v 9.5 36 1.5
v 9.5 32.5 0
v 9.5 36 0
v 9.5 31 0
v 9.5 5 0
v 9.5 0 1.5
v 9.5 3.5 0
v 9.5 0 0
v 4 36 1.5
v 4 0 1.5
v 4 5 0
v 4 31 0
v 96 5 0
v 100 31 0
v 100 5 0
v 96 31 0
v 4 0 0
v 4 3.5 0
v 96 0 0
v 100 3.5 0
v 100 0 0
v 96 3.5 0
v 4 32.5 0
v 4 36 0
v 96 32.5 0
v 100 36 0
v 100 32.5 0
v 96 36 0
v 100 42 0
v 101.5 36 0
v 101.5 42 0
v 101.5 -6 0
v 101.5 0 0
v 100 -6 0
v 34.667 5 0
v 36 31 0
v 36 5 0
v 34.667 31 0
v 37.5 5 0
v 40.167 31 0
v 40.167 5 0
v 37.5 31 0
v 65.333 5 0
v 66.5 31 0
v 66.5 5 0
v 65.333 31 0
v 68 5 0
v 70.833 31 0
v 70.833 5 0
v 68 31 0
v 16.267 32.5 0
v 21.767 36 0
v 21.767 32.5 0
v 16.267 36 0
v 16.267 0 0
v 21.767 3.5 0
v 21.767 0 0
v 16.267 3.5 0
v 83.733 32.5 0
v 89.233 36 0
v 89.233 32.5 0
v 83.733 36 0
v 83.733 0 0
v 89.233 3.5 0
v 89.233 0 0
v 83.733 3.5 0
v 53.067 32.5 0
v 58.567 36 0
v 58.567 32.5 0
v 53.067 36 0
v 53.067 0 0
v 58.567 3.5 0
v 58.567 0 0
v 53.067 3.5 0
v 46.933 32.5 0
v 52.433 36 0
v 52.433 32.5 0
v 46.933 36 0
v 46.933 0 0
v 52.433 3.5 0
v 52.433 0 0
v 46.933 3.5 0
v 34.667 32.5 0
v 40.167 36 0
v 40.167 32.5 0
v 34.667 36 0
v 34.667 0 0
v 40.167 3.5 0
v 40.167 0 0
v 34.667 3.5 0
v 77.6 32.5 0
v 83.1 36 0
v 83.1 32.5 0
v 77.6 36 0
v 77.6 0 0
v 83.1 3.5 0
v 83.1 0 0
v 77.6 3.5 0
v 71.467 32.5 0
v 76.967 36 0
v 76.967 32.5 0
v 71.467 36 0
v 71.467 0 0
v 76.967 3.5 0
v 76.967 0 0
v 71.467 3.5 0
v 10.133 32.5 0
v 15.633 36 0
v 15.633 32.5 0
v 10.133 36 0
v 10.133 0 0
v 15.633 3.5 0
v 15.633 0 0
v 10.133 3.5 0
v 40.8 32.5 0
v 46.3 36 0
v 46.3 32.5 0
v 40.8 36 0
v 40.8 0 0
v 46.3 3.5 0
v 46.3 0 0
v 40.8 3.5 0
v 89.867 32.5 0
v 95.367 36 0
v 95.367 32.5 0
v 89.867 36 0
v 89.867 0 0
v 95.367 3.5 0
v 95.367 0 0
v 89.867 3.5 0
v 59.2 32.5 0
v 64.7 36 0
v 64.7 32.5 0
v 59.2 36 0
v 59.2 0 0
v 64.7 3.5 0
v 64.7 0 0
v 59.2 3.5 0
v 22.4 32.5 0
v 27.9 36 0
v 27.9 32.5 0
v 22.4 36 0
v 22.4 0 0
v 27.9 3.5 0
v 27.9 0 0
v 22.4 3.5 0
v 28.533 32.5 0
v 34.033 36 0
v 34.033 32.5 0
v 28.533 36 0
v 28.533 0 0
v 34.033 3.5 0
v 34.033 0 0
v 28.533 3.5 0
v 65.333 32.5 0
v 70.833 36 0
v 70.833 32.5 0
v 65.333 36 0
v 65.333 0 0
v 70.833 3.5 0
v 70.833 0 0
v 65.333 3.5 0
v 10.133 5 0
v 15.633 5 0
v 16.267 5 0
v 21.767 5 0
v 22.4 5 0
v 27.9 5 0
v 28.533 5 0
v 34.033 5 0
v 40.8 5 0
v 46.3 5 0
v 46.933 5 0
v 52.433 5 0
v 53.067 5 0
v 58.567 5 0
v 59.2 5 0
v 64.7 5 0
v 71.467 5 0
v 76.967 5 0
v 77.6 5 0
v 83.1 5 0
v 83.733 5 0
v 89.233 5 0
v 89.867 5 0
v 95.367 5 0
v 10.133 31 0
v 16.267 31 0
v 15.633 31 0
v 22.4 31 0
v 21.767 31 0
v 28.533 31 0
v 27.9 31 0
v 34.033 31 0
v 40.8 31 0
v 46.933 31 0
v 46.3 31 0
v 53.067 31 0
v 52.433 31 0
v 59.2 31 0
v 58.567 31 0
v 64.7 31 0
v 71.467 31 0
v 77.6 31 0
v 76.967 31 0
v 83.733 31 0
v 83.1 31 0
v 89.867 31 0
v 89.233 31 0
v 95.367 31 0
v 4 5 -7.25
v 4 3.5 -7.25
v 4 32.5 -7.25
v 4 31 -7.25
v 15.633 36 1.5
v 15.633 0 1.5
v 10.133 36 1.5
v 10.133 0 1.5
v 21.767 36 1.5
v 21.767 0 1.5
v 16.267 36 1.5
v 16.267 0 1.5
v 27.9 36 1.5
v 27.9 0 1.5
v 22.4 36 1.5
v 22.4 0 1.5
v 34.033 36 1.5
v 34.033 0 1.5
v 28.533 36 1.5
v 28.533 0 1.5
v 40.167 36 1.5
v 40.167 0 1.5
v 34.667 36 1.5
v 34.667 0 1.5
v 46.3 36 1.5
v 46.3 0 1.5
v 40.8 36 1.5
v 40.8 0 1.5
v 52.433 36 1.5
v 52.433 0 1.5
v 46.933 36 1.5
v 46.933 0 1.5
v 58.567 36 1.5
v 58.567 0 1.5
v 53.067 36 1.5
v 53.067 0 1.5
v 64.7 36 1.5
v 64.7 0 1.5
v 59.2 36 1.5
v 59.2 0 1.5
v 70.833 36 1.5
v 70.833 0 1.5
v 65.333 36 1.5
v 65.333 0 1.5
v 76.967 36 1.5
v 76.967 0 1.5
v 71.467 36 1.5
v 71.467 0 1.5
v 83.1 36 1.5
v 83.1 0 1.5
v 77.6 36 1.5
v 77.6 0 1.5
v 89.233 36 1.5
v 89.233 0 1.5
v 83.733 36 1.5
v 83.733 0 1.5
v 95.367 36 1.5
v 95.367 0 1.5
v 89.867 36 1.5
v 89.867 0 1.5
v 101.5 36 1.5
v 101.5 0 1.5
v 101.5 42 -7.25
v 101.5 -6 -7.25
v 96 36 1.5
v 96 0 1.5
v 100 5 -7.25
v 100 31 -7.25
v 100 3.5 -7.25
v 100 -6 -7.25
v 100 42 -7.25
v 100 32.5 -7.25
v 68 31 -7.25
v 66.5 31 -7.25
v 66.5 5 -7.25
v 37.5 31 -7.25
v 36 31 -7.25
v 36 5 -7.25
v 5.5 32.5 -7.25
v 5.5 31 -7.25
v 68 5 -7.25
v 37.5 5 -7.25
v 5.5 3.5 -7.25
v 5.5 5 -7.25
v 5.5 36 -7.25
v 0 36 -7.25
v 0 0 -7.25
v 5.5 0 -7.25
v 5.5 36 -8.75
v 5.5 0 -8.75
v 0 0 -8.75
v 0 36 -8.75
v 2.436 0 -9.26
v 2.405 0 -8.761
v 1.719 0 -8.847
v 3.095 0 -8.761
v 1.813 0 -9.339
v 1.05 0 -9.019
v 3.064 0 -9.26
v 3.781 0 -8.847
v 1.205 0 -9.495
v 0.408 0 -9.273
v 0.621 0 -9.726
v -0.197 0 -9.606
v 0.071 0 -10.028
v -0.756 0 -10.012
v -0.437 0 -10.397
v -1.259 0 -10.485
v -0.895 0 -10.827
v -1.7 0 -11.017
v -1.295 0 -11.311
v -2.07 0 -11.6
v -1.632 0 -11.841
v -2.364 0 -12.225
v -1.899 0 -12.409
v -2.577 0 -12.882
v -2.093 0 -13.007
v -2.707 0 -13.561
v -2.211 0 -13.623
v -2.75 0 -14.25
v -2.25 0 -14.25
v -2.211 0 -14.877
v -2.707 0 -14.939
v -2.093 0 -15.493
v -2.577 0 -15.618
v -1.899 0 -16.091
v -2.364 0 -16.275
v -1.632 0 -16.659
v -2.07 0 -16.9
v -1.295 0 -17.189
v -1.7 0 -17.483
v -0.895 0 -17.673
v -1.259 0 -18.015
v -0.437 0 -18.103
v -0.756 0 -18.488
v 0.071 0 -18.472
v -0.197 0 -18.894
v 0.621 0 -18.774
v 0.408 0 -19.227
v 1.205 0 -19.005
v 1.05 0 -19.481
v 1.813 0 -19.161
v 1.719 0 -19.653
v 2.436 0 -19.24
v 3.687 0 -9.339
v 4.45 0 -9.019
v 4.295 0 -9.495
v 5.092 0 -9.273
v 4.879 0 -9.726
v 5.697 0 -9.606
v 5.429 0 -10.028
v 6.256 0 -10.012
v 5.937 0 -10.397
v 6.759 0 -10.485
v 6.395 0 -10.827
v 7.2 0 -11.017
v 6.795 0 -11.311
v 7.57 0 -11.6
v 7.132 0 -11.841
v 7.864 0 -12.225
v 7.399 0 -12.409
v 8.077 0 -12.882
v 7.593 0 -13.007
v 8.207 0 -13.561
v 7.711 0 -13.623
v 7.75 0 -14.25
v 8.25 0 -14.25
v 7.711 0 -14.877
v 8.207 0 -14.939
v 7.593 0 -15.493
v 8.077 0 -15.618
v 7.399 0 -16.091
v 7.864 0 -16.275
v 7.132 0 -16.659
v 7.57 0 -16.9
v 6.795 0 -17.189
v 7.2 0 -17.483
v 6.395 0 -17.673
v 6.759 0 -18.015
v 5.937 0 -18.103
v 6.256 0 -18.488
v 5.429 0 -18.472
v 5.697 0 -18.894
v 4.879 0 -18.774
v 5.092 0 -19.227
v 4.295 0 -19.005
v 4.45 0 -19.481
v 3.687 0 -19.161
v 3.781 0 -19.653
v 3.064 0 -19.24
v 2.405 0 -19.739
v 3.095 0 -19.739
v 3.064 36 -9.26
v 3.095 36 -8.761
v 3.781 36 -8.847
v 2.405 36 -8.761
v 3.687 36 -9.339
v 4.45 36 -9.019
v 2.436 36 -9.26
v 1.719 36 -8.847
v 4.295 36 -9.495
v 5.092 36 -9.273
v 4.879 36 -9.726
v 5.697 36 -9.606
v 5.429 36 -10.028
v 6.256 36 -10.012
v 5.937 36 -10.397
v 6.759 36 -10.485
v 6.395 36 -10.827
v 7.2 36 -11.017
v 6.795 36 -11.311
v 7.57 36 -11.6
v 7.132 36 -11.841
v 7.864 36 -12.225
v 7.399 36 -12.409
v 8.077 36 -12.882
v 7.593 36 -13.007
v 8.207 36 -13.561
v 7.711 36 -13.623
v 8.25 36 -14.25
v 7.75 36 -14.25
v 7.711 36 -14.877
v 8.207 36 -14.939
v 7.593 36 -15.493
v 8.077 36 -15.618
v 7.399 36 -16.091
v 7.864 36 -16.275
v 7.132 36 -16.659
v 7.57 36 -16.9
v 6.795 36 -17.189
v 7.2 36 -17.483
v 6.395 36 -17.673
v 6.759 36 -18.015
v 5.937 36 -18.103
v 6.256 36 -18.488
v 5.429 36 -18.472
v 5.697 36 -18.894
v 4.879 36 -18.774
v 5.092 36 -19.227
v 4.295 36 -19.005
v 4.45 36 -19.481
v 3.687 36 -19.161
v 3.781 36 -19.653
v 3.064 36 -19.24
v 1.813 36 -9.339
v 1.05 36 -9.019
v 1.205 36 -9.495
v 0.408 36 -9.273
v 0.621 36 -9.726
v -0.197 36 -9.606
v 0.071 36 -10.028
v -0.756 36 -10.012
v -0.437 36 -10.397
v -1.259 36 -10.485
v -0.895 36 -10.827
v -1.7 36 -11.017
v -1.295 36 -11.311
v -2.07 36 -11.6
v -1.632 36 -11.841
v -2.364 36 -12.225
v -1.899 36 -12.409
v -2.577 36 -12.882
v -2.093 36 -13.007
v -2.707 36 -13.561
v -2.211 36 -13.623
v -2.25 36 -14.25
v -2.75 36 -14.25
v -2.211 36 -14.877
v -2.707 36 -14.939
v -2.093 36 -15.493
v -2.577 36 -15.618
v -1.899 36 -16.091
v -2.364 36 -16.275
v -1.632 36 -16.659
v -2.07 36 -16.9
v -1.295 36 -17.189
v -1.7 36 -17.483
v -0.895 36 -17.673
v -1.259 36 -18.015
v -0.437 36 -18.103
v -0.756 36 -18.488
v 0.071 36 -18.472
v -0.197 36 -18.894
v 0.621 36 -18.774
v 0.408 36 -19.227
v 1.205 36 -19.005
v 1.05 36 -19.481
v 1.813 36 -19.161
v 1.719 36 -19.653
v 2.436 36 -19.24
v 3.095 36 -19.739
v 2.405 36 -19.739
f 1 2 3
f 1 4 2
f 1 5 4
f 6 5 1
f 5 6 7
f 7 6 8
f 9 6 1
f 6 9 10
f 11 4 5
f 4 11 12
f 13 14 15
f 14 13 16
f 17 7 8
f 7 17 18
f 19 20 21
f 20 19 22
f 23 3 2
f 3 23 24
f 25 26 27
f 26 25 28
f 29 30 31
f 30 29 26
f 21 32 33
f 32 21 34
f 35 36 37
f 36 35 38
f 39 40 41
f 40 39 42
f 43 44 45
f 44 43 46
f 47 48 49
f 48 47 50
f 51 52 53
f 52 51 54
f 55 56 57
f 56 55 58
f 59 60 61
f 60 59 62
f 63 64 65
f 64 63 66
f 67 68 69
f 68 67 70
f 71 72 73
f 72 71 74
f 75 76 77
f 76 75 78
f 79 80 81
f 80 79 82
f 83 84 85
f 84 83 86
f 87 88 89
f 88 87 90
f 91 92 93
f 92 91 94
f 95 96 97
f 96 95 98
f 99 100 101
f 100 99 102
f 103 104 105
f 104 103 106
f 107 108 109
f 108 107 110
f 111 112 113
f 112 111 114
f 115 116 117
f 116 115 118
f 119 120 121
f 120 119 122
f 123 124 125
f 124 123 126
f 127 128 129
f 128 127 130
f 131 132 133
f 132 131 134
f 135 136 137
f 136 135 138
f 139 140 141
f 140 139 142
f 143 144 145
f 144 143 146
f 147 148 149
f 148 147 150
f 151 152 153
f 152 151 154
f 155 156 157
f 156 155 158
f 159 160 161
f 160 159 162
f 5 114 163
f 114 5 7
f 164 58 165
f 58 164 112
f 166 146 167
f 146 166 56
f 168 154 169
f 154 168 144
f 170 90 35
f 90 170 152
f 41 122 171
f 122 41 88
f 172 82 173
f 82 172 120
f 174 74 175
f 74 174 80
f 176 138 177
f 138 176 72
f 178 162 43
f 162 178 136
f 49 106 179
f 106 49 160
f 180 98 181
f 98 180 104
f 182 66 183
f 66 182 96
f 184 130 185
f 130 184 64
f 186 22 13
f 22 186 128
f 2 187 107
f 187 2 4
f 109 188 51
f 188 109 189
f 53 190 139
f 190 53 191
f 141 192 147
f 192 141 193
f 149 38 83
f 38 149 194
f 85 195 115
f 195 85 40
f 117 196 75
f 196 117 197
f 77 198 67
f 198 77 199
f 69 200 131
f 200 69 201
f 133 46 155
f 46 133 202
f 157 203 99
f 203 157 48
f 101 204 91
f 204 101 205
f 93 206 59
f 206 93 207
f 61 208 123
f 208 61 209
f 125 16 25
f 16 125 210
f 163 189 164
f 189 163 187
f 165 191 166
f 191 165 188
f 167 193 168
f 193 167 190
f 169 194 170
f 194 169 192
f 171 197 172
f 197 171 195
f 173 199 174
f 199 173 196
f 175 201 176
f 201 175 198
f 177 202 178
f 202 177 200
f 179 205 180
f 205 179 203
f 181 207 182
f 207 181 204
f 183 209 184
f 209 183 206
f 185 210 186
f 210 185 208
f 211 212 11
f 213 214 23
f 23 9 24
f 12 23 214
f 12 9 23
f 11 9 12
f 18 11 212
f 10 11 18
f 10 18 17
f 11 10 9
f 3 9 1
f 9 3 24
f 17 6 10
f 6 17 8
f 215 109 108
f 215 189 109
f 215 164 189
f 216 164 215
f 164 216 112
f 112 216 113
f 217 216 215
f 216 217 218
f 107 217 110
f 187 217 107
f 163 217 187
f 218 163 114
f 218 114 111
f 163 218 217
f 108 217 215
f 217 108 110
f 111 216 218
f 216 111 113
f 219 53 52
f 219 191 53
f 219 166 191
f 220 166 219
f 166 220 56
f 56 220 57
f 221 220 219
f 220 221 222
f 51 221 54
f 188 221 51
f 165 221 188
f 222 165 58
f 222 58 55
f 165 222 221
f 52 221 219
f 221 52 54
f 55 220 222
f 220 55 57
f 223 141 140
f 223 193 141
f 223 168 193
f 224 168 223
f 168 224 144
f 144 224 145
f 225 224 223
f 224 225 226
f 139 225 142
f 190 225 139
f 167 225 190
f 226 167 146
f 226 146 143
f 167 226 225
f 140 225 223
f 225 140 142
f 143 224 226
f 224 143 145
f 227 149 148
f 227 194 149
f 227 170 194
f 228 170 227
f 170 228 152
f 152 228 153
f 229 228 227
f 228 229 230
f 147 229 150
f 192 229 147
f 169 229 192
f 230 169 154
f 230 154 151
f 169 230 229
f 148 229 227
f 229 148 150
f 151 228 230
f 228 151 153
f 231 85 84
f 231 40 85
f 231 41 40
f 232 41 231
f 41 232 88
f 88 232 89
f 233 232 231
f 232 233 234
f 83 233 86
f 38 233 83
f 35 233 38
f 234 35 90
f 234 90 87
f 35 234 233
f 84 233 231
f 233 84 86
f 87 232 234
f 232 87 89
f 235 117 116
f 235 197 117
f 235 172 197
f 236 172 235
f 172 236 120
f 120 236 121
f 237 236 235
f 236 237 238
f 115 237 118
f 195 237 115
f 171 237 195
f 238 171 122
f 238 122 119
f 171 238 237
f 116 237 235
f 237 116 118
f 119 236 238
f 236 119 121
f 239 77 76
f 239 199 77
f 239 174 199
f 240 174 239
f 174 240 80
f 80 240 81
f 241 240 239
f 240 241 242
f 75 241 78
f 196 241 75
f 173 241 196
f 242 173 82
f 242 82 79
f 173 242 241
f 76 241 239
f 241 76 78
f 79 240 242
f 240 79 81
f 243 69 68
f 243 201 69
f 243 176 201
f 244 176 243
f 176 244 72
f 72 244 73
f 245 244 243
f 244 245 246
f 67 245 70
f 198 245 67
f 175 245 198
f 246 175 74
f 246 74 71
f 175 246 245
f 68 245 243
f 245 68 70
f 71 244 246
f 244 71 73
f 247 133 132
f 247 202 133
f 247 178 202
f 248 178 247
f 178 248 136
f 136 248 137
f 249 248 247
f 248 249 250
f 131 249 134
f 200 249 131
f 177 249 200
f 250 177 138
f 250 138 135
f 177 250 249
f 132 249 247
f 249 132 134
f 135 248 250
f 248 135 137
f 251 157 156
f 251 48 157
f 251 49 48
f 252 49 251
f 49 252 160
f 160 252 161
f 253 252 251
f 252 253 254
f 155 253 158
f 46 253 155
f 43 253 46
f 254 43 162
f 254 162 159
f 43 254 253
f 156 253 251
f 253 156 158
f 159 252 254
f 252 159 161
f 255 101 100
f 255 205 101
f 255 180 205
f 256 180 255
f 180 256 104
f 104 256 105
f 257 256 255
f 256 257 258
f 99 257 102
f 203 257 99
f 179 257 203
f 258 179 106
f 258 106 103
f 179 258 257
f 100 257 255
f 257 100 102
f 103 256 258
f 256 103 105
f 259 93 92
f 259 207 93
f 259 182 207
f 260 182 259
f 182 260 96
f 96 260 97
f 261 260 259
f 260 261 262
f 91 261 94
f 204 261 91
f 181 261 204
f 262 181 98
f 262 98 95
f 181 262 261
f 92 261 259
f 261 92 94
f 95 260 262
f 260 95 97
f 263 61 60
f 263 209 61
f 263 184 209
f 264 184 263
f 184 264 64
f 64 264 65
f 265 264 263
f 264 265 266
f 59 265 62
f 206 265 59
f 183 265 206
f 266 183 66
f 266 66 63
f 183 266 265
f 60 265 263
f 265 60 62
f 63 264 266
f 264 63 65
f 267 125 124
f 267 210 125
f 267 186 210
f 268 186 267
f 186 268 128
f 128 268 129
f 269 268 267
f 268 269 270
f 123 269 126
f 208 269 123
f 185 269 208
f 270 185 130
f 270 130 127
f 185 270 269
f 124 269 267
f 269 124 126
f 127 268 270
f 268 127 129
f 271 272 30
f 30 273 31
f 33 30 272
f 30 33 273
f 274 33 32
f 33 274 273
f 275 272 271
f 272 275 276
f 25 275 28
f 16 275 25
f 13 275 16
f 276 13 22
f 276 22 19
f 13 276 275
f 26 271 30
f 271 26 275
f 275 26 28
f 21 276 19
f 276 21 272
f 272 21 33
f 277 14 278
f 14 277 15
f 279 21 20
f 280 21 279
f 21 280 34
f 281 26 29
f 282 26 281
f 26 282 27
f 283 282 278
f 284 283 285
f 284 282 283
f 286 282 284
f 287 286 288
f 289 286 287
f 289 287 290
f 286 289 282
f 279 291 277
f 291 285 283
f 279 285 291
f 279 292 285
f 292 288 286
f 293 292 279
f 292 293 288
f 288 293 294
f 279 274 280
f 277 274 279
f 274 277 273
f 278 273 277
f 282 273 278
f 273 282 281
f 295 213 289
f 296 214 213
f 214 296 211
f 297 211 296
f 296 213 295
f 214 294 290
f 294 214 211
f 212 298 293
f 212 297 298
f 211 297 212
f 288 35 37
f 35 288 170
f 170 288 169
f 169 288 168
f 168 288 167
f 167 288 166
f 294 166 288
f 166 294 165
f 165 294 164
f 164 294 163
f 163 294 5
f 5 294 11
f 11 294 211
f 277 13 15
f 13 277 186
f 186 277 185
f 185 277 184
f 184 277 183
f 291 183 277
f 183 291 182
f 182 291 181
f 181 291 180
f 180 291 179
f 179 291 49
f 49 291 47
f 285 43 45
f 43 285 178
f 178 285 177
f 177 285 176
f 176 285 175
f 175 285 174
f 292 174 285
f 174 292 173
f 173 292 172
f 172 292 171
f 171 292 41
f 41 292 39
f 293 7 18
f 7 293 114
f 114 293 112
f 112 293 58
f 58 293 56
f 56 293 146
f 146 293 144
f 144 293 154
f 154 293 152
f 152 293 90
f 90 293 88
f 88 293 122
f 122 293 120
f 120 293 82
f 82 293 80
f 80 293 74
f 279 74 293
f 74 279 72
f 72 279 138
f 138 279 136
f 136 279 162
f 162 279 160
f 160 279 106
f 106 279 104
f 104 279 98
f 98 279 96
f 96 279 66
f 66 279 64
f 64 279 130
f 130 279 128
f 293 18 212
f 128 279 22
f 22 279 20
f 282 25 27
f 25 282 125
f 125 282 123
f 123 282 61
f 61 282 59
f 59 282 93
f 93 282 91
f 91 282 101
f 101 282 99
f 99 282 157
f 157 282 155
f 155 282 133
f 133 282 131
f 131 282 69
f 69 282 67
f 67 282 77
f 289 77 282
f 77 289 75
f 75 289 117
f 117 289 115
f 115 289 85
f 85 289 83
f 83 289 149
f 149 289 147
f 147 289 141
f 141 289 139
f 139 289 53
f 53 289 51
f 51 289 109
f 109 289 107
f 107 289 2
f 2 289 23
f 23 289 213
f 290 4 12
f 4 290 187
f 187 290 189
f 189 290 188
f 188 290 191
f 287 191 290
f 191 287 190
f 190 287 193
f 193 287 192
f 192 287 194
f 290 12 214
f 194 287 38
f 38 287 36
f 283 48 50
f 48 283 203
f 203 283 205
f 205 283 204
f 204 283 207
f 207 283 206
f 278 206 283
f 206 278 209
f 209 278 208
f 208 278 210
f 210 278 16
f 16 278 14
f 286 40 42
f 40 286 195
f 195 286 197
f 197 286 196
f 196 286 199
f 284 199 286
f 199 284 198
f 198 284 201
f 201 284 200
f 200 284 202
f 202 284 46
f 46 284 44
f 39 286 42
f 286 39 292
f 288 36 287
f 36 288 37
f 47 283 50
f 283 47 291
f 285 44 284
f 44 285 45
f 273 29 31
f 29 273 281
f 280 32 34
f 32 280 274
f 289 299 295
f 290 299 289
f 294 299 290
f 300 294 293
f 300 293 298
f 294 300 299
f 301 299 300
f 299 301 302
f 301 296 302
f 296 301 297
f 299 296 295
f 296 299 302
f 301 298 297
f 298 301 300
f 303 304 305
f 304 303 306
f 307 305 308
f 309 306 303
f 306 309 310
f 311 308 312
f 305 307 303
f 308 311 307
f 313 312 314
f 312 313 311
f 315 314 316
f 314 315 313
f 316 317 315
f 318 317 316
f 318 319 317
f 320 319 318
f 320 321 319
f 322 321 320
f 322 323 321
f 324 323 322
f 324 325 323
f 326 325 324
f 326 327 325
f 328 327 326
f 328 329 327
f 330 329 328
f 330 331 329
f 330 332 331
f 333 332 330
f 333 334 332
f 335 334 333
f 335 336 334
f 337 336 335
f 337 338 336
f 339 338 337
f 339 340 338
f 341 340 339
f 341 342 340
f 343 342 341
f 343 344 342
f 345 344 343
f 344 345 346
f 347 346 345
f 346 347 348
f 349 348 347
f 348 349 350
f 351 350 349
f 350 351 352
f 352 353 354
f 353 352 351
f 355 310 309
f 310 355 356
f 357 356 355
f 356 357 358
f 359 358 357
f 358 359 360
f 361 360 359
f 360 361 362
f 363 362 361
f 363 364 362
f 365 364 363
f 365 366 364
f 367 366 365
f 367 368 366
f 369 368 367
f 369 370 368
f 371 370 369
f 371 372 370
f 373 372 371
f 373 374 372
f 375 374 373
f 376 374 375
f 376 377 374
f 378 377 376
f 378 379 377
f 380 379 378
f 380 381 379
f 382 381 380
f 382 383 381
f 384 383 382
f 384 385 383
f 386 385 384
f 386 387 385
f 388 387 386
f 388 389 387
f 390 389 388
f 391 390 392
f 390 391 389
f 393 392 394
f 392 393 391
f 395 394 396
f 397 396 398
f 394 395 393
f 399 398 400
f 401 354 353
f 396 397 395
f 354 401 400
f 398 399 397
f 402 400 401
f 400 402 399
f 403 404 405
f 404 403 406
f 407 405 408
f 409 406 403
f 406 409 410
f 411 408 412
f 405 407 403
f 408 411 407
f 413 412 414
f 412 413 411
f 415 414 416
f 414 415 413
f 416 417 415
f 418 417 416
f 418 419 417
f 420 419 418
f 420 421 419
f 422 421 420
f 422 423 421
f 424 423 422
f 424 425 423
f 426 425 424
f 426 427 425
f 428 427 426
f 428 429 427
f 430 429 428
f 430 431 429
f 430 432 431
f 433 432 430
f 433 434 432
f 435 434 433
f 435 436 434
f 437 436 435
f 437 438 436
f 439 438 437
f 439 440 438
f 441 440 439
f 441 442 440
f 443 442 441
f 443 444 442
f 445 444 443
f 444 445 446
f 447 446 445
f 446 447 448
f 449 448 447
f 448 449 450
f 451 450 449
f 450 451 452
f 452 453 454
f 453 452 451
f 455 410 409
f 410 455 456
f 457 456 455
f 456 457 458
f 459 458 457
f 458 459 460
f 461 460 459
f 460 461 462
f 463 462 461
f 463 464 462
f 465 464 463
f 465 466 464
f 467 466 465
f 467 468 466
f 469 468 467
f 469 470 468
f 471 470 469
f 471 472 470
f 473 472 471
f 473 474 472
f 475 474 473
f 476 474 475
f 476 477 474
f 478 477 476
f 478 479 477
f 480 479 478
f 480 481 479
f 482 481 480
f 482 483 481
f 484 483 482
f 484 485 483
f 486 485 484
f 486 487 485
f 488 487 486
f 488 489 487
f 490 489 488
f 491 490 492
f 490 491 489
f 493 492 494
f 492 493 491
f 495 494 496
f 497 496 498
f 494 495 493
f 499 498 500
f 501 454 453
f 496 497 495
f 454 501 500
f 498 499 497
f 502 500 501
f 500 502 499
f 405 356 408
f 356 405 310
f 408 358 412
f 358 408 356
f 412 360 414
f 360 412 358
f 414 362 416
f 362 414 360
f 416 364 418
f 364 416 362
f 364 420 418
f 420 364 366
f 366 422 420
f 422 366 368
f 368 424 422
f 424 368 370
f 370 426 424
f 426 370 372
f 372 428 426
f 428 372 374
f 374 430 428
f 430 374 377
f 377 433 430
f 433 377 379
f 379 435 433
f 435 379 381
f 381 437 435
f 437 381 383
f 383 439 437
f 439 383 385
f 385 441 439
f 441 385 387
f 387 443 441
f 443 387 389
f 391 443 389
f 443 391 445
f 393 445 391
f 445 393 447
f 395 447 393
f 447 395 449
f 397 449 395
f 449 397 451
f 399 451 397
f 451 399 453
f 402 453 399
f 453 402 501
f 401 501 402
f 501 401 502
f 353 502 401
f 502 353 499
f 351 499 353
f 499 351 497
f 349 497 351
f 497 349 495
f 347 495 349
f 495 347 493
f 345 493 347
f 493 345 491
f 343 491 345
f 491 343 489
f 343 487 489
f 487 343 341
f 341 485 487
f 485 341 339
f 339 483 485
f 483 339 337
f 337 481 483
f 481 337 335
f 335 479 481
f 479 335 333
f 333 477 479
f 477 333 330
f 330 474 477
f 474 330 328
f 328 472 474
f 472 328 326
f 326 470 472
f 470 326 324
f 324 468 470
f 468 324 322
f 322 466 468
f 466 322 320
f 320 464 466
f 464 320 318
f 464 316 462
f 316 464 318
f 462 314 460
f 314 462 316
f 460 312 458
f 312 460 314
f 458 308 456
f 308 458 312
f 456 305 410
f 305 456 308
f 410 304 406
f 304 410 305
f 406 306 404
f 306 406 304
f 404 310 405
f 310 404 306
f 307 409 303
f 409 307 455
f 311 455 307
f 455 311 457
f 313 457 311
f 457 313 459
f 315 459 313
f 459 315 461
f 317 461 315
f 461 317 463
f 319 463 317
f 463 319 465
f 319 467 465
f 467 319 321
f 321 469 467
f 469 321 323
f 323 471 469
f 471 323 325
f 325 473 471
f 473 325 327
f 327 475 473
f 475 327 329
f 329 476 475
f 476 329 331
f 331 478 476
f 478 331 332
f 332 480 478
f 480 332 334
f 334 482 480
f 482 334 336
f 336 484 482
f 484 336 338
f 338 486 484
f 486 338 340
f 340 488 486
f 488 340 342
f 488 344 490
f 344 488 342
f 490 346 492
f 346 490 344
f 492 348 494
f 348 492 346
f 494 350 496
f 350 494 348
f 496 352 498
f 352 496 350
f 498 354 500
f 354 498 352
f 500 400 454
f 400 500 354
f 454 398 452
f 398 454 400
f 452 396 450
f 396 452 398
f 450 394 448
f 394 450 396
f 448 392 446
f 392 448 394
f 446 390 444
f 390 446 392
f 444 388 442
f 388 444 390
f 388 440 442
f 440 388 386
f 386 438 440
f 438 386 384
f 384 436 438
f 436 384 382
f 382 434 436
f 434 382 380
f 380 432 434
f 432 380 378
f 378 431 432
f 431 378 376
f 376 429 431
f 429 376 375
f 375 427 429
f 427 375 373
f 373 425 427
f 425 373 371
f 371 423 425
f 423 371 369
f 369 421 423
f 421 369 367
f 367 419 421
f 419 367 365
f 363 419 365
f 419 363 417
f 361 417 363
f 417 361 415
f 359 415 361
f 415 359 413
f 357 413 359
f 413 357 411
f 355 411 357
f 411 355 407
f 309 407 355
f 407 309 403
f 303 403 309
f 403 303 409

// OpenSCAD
// FUNCTIONS:

function hypotenuse(x,y) = sqrt ( x*x + y*y );

// PARAMETERS:

// All distances are in inches.
//
tread_width = 3*12;
    // Tread width.
backwall_width = 4 * 12;
    // Width of backwall.       
length = 12*8;
    // Length of section including bearing.
bearing = 1.5;
    // Section end berring.
number_of_treads = length/6;
    // 6 inches per tread.
stretch = 2.0/(number_of_treads - 1);
    // Amount that each 1/2 inch gap must be
    // stretched to accommodate backwall and
    // extra 1/2 inch.
section_length = length + 1.5;
    // Total length of section including one backwall.

// Stringers are 2x8's.  Sill is 6x6.

// COMPONENTS:

module tread()
{
    color ("SandyBrown")
        cube ([5.5,tread_width,1.5]);
}
module stringer()
{
    color ("Chocolate")
        cube ([length,1.5,7.25]);
}
module block()
{
    color ("Salmon")
        cube ([1.5,tread_width - 2*3.5 - 2*1.5,7.25]);
}
module backwall()
{
    color ("LightGray")
        cube ([1.5,backwall_width,7.25]);
}
module sill()
{
    color ("LightGray")
        cube ([5.5,tread_width,5.5]);
}
module pad()
{
    color ("LightGray")
        cube ([5.5,tread_width,1.5]);
}
module pipe()
{
    rotate ( [-90,0,0] )
    color ("Gray")
    linear_extrude ( height = tread_width, $fn=50 )
    {
	difference()
	{
	    circle ( d=11 );
	    circle ( d=10 );
	}
    }
}

// ASSEMBLIES:

module treads()
{
    for (dx = [0:6+stretch:section_length]) {
        translate ([dx + 5.5 - bearing,0,0]) tread();
    }
}
module stringers()
{
    for (dy = [3.5,tread_width - 3.5 - 1.5]) {
        translate ([5.5 - bearing,dy,-7.25]) stringer();
    }
}
module blocks()
{
    for (dx = [length/3, length - length/3 - 1.5]) {
        translate ([5.5 - bearing + dx,3.5 + 1.5,-7.25])
	block();
    }
}
module backwalls()
{
    overhang = (backwall_width - tread_width)/2;
    translate ([5.5 - bearing + length,-overhang,-7.25])
	backwall();
}        
module sills() {
    translate ([0,0,-7.25 - 5.5]) sill();
}
module pads() {
    translate ([0,0,-7.25 - 1.5]) pad();
}
module pipes() {
    translate ([5.5/2,0,-7.25 - 5.5 - 1.5]) pipe();
}

treads();
stringers();
blocks();
backwalls();
// sills();
pads();
pipes();
